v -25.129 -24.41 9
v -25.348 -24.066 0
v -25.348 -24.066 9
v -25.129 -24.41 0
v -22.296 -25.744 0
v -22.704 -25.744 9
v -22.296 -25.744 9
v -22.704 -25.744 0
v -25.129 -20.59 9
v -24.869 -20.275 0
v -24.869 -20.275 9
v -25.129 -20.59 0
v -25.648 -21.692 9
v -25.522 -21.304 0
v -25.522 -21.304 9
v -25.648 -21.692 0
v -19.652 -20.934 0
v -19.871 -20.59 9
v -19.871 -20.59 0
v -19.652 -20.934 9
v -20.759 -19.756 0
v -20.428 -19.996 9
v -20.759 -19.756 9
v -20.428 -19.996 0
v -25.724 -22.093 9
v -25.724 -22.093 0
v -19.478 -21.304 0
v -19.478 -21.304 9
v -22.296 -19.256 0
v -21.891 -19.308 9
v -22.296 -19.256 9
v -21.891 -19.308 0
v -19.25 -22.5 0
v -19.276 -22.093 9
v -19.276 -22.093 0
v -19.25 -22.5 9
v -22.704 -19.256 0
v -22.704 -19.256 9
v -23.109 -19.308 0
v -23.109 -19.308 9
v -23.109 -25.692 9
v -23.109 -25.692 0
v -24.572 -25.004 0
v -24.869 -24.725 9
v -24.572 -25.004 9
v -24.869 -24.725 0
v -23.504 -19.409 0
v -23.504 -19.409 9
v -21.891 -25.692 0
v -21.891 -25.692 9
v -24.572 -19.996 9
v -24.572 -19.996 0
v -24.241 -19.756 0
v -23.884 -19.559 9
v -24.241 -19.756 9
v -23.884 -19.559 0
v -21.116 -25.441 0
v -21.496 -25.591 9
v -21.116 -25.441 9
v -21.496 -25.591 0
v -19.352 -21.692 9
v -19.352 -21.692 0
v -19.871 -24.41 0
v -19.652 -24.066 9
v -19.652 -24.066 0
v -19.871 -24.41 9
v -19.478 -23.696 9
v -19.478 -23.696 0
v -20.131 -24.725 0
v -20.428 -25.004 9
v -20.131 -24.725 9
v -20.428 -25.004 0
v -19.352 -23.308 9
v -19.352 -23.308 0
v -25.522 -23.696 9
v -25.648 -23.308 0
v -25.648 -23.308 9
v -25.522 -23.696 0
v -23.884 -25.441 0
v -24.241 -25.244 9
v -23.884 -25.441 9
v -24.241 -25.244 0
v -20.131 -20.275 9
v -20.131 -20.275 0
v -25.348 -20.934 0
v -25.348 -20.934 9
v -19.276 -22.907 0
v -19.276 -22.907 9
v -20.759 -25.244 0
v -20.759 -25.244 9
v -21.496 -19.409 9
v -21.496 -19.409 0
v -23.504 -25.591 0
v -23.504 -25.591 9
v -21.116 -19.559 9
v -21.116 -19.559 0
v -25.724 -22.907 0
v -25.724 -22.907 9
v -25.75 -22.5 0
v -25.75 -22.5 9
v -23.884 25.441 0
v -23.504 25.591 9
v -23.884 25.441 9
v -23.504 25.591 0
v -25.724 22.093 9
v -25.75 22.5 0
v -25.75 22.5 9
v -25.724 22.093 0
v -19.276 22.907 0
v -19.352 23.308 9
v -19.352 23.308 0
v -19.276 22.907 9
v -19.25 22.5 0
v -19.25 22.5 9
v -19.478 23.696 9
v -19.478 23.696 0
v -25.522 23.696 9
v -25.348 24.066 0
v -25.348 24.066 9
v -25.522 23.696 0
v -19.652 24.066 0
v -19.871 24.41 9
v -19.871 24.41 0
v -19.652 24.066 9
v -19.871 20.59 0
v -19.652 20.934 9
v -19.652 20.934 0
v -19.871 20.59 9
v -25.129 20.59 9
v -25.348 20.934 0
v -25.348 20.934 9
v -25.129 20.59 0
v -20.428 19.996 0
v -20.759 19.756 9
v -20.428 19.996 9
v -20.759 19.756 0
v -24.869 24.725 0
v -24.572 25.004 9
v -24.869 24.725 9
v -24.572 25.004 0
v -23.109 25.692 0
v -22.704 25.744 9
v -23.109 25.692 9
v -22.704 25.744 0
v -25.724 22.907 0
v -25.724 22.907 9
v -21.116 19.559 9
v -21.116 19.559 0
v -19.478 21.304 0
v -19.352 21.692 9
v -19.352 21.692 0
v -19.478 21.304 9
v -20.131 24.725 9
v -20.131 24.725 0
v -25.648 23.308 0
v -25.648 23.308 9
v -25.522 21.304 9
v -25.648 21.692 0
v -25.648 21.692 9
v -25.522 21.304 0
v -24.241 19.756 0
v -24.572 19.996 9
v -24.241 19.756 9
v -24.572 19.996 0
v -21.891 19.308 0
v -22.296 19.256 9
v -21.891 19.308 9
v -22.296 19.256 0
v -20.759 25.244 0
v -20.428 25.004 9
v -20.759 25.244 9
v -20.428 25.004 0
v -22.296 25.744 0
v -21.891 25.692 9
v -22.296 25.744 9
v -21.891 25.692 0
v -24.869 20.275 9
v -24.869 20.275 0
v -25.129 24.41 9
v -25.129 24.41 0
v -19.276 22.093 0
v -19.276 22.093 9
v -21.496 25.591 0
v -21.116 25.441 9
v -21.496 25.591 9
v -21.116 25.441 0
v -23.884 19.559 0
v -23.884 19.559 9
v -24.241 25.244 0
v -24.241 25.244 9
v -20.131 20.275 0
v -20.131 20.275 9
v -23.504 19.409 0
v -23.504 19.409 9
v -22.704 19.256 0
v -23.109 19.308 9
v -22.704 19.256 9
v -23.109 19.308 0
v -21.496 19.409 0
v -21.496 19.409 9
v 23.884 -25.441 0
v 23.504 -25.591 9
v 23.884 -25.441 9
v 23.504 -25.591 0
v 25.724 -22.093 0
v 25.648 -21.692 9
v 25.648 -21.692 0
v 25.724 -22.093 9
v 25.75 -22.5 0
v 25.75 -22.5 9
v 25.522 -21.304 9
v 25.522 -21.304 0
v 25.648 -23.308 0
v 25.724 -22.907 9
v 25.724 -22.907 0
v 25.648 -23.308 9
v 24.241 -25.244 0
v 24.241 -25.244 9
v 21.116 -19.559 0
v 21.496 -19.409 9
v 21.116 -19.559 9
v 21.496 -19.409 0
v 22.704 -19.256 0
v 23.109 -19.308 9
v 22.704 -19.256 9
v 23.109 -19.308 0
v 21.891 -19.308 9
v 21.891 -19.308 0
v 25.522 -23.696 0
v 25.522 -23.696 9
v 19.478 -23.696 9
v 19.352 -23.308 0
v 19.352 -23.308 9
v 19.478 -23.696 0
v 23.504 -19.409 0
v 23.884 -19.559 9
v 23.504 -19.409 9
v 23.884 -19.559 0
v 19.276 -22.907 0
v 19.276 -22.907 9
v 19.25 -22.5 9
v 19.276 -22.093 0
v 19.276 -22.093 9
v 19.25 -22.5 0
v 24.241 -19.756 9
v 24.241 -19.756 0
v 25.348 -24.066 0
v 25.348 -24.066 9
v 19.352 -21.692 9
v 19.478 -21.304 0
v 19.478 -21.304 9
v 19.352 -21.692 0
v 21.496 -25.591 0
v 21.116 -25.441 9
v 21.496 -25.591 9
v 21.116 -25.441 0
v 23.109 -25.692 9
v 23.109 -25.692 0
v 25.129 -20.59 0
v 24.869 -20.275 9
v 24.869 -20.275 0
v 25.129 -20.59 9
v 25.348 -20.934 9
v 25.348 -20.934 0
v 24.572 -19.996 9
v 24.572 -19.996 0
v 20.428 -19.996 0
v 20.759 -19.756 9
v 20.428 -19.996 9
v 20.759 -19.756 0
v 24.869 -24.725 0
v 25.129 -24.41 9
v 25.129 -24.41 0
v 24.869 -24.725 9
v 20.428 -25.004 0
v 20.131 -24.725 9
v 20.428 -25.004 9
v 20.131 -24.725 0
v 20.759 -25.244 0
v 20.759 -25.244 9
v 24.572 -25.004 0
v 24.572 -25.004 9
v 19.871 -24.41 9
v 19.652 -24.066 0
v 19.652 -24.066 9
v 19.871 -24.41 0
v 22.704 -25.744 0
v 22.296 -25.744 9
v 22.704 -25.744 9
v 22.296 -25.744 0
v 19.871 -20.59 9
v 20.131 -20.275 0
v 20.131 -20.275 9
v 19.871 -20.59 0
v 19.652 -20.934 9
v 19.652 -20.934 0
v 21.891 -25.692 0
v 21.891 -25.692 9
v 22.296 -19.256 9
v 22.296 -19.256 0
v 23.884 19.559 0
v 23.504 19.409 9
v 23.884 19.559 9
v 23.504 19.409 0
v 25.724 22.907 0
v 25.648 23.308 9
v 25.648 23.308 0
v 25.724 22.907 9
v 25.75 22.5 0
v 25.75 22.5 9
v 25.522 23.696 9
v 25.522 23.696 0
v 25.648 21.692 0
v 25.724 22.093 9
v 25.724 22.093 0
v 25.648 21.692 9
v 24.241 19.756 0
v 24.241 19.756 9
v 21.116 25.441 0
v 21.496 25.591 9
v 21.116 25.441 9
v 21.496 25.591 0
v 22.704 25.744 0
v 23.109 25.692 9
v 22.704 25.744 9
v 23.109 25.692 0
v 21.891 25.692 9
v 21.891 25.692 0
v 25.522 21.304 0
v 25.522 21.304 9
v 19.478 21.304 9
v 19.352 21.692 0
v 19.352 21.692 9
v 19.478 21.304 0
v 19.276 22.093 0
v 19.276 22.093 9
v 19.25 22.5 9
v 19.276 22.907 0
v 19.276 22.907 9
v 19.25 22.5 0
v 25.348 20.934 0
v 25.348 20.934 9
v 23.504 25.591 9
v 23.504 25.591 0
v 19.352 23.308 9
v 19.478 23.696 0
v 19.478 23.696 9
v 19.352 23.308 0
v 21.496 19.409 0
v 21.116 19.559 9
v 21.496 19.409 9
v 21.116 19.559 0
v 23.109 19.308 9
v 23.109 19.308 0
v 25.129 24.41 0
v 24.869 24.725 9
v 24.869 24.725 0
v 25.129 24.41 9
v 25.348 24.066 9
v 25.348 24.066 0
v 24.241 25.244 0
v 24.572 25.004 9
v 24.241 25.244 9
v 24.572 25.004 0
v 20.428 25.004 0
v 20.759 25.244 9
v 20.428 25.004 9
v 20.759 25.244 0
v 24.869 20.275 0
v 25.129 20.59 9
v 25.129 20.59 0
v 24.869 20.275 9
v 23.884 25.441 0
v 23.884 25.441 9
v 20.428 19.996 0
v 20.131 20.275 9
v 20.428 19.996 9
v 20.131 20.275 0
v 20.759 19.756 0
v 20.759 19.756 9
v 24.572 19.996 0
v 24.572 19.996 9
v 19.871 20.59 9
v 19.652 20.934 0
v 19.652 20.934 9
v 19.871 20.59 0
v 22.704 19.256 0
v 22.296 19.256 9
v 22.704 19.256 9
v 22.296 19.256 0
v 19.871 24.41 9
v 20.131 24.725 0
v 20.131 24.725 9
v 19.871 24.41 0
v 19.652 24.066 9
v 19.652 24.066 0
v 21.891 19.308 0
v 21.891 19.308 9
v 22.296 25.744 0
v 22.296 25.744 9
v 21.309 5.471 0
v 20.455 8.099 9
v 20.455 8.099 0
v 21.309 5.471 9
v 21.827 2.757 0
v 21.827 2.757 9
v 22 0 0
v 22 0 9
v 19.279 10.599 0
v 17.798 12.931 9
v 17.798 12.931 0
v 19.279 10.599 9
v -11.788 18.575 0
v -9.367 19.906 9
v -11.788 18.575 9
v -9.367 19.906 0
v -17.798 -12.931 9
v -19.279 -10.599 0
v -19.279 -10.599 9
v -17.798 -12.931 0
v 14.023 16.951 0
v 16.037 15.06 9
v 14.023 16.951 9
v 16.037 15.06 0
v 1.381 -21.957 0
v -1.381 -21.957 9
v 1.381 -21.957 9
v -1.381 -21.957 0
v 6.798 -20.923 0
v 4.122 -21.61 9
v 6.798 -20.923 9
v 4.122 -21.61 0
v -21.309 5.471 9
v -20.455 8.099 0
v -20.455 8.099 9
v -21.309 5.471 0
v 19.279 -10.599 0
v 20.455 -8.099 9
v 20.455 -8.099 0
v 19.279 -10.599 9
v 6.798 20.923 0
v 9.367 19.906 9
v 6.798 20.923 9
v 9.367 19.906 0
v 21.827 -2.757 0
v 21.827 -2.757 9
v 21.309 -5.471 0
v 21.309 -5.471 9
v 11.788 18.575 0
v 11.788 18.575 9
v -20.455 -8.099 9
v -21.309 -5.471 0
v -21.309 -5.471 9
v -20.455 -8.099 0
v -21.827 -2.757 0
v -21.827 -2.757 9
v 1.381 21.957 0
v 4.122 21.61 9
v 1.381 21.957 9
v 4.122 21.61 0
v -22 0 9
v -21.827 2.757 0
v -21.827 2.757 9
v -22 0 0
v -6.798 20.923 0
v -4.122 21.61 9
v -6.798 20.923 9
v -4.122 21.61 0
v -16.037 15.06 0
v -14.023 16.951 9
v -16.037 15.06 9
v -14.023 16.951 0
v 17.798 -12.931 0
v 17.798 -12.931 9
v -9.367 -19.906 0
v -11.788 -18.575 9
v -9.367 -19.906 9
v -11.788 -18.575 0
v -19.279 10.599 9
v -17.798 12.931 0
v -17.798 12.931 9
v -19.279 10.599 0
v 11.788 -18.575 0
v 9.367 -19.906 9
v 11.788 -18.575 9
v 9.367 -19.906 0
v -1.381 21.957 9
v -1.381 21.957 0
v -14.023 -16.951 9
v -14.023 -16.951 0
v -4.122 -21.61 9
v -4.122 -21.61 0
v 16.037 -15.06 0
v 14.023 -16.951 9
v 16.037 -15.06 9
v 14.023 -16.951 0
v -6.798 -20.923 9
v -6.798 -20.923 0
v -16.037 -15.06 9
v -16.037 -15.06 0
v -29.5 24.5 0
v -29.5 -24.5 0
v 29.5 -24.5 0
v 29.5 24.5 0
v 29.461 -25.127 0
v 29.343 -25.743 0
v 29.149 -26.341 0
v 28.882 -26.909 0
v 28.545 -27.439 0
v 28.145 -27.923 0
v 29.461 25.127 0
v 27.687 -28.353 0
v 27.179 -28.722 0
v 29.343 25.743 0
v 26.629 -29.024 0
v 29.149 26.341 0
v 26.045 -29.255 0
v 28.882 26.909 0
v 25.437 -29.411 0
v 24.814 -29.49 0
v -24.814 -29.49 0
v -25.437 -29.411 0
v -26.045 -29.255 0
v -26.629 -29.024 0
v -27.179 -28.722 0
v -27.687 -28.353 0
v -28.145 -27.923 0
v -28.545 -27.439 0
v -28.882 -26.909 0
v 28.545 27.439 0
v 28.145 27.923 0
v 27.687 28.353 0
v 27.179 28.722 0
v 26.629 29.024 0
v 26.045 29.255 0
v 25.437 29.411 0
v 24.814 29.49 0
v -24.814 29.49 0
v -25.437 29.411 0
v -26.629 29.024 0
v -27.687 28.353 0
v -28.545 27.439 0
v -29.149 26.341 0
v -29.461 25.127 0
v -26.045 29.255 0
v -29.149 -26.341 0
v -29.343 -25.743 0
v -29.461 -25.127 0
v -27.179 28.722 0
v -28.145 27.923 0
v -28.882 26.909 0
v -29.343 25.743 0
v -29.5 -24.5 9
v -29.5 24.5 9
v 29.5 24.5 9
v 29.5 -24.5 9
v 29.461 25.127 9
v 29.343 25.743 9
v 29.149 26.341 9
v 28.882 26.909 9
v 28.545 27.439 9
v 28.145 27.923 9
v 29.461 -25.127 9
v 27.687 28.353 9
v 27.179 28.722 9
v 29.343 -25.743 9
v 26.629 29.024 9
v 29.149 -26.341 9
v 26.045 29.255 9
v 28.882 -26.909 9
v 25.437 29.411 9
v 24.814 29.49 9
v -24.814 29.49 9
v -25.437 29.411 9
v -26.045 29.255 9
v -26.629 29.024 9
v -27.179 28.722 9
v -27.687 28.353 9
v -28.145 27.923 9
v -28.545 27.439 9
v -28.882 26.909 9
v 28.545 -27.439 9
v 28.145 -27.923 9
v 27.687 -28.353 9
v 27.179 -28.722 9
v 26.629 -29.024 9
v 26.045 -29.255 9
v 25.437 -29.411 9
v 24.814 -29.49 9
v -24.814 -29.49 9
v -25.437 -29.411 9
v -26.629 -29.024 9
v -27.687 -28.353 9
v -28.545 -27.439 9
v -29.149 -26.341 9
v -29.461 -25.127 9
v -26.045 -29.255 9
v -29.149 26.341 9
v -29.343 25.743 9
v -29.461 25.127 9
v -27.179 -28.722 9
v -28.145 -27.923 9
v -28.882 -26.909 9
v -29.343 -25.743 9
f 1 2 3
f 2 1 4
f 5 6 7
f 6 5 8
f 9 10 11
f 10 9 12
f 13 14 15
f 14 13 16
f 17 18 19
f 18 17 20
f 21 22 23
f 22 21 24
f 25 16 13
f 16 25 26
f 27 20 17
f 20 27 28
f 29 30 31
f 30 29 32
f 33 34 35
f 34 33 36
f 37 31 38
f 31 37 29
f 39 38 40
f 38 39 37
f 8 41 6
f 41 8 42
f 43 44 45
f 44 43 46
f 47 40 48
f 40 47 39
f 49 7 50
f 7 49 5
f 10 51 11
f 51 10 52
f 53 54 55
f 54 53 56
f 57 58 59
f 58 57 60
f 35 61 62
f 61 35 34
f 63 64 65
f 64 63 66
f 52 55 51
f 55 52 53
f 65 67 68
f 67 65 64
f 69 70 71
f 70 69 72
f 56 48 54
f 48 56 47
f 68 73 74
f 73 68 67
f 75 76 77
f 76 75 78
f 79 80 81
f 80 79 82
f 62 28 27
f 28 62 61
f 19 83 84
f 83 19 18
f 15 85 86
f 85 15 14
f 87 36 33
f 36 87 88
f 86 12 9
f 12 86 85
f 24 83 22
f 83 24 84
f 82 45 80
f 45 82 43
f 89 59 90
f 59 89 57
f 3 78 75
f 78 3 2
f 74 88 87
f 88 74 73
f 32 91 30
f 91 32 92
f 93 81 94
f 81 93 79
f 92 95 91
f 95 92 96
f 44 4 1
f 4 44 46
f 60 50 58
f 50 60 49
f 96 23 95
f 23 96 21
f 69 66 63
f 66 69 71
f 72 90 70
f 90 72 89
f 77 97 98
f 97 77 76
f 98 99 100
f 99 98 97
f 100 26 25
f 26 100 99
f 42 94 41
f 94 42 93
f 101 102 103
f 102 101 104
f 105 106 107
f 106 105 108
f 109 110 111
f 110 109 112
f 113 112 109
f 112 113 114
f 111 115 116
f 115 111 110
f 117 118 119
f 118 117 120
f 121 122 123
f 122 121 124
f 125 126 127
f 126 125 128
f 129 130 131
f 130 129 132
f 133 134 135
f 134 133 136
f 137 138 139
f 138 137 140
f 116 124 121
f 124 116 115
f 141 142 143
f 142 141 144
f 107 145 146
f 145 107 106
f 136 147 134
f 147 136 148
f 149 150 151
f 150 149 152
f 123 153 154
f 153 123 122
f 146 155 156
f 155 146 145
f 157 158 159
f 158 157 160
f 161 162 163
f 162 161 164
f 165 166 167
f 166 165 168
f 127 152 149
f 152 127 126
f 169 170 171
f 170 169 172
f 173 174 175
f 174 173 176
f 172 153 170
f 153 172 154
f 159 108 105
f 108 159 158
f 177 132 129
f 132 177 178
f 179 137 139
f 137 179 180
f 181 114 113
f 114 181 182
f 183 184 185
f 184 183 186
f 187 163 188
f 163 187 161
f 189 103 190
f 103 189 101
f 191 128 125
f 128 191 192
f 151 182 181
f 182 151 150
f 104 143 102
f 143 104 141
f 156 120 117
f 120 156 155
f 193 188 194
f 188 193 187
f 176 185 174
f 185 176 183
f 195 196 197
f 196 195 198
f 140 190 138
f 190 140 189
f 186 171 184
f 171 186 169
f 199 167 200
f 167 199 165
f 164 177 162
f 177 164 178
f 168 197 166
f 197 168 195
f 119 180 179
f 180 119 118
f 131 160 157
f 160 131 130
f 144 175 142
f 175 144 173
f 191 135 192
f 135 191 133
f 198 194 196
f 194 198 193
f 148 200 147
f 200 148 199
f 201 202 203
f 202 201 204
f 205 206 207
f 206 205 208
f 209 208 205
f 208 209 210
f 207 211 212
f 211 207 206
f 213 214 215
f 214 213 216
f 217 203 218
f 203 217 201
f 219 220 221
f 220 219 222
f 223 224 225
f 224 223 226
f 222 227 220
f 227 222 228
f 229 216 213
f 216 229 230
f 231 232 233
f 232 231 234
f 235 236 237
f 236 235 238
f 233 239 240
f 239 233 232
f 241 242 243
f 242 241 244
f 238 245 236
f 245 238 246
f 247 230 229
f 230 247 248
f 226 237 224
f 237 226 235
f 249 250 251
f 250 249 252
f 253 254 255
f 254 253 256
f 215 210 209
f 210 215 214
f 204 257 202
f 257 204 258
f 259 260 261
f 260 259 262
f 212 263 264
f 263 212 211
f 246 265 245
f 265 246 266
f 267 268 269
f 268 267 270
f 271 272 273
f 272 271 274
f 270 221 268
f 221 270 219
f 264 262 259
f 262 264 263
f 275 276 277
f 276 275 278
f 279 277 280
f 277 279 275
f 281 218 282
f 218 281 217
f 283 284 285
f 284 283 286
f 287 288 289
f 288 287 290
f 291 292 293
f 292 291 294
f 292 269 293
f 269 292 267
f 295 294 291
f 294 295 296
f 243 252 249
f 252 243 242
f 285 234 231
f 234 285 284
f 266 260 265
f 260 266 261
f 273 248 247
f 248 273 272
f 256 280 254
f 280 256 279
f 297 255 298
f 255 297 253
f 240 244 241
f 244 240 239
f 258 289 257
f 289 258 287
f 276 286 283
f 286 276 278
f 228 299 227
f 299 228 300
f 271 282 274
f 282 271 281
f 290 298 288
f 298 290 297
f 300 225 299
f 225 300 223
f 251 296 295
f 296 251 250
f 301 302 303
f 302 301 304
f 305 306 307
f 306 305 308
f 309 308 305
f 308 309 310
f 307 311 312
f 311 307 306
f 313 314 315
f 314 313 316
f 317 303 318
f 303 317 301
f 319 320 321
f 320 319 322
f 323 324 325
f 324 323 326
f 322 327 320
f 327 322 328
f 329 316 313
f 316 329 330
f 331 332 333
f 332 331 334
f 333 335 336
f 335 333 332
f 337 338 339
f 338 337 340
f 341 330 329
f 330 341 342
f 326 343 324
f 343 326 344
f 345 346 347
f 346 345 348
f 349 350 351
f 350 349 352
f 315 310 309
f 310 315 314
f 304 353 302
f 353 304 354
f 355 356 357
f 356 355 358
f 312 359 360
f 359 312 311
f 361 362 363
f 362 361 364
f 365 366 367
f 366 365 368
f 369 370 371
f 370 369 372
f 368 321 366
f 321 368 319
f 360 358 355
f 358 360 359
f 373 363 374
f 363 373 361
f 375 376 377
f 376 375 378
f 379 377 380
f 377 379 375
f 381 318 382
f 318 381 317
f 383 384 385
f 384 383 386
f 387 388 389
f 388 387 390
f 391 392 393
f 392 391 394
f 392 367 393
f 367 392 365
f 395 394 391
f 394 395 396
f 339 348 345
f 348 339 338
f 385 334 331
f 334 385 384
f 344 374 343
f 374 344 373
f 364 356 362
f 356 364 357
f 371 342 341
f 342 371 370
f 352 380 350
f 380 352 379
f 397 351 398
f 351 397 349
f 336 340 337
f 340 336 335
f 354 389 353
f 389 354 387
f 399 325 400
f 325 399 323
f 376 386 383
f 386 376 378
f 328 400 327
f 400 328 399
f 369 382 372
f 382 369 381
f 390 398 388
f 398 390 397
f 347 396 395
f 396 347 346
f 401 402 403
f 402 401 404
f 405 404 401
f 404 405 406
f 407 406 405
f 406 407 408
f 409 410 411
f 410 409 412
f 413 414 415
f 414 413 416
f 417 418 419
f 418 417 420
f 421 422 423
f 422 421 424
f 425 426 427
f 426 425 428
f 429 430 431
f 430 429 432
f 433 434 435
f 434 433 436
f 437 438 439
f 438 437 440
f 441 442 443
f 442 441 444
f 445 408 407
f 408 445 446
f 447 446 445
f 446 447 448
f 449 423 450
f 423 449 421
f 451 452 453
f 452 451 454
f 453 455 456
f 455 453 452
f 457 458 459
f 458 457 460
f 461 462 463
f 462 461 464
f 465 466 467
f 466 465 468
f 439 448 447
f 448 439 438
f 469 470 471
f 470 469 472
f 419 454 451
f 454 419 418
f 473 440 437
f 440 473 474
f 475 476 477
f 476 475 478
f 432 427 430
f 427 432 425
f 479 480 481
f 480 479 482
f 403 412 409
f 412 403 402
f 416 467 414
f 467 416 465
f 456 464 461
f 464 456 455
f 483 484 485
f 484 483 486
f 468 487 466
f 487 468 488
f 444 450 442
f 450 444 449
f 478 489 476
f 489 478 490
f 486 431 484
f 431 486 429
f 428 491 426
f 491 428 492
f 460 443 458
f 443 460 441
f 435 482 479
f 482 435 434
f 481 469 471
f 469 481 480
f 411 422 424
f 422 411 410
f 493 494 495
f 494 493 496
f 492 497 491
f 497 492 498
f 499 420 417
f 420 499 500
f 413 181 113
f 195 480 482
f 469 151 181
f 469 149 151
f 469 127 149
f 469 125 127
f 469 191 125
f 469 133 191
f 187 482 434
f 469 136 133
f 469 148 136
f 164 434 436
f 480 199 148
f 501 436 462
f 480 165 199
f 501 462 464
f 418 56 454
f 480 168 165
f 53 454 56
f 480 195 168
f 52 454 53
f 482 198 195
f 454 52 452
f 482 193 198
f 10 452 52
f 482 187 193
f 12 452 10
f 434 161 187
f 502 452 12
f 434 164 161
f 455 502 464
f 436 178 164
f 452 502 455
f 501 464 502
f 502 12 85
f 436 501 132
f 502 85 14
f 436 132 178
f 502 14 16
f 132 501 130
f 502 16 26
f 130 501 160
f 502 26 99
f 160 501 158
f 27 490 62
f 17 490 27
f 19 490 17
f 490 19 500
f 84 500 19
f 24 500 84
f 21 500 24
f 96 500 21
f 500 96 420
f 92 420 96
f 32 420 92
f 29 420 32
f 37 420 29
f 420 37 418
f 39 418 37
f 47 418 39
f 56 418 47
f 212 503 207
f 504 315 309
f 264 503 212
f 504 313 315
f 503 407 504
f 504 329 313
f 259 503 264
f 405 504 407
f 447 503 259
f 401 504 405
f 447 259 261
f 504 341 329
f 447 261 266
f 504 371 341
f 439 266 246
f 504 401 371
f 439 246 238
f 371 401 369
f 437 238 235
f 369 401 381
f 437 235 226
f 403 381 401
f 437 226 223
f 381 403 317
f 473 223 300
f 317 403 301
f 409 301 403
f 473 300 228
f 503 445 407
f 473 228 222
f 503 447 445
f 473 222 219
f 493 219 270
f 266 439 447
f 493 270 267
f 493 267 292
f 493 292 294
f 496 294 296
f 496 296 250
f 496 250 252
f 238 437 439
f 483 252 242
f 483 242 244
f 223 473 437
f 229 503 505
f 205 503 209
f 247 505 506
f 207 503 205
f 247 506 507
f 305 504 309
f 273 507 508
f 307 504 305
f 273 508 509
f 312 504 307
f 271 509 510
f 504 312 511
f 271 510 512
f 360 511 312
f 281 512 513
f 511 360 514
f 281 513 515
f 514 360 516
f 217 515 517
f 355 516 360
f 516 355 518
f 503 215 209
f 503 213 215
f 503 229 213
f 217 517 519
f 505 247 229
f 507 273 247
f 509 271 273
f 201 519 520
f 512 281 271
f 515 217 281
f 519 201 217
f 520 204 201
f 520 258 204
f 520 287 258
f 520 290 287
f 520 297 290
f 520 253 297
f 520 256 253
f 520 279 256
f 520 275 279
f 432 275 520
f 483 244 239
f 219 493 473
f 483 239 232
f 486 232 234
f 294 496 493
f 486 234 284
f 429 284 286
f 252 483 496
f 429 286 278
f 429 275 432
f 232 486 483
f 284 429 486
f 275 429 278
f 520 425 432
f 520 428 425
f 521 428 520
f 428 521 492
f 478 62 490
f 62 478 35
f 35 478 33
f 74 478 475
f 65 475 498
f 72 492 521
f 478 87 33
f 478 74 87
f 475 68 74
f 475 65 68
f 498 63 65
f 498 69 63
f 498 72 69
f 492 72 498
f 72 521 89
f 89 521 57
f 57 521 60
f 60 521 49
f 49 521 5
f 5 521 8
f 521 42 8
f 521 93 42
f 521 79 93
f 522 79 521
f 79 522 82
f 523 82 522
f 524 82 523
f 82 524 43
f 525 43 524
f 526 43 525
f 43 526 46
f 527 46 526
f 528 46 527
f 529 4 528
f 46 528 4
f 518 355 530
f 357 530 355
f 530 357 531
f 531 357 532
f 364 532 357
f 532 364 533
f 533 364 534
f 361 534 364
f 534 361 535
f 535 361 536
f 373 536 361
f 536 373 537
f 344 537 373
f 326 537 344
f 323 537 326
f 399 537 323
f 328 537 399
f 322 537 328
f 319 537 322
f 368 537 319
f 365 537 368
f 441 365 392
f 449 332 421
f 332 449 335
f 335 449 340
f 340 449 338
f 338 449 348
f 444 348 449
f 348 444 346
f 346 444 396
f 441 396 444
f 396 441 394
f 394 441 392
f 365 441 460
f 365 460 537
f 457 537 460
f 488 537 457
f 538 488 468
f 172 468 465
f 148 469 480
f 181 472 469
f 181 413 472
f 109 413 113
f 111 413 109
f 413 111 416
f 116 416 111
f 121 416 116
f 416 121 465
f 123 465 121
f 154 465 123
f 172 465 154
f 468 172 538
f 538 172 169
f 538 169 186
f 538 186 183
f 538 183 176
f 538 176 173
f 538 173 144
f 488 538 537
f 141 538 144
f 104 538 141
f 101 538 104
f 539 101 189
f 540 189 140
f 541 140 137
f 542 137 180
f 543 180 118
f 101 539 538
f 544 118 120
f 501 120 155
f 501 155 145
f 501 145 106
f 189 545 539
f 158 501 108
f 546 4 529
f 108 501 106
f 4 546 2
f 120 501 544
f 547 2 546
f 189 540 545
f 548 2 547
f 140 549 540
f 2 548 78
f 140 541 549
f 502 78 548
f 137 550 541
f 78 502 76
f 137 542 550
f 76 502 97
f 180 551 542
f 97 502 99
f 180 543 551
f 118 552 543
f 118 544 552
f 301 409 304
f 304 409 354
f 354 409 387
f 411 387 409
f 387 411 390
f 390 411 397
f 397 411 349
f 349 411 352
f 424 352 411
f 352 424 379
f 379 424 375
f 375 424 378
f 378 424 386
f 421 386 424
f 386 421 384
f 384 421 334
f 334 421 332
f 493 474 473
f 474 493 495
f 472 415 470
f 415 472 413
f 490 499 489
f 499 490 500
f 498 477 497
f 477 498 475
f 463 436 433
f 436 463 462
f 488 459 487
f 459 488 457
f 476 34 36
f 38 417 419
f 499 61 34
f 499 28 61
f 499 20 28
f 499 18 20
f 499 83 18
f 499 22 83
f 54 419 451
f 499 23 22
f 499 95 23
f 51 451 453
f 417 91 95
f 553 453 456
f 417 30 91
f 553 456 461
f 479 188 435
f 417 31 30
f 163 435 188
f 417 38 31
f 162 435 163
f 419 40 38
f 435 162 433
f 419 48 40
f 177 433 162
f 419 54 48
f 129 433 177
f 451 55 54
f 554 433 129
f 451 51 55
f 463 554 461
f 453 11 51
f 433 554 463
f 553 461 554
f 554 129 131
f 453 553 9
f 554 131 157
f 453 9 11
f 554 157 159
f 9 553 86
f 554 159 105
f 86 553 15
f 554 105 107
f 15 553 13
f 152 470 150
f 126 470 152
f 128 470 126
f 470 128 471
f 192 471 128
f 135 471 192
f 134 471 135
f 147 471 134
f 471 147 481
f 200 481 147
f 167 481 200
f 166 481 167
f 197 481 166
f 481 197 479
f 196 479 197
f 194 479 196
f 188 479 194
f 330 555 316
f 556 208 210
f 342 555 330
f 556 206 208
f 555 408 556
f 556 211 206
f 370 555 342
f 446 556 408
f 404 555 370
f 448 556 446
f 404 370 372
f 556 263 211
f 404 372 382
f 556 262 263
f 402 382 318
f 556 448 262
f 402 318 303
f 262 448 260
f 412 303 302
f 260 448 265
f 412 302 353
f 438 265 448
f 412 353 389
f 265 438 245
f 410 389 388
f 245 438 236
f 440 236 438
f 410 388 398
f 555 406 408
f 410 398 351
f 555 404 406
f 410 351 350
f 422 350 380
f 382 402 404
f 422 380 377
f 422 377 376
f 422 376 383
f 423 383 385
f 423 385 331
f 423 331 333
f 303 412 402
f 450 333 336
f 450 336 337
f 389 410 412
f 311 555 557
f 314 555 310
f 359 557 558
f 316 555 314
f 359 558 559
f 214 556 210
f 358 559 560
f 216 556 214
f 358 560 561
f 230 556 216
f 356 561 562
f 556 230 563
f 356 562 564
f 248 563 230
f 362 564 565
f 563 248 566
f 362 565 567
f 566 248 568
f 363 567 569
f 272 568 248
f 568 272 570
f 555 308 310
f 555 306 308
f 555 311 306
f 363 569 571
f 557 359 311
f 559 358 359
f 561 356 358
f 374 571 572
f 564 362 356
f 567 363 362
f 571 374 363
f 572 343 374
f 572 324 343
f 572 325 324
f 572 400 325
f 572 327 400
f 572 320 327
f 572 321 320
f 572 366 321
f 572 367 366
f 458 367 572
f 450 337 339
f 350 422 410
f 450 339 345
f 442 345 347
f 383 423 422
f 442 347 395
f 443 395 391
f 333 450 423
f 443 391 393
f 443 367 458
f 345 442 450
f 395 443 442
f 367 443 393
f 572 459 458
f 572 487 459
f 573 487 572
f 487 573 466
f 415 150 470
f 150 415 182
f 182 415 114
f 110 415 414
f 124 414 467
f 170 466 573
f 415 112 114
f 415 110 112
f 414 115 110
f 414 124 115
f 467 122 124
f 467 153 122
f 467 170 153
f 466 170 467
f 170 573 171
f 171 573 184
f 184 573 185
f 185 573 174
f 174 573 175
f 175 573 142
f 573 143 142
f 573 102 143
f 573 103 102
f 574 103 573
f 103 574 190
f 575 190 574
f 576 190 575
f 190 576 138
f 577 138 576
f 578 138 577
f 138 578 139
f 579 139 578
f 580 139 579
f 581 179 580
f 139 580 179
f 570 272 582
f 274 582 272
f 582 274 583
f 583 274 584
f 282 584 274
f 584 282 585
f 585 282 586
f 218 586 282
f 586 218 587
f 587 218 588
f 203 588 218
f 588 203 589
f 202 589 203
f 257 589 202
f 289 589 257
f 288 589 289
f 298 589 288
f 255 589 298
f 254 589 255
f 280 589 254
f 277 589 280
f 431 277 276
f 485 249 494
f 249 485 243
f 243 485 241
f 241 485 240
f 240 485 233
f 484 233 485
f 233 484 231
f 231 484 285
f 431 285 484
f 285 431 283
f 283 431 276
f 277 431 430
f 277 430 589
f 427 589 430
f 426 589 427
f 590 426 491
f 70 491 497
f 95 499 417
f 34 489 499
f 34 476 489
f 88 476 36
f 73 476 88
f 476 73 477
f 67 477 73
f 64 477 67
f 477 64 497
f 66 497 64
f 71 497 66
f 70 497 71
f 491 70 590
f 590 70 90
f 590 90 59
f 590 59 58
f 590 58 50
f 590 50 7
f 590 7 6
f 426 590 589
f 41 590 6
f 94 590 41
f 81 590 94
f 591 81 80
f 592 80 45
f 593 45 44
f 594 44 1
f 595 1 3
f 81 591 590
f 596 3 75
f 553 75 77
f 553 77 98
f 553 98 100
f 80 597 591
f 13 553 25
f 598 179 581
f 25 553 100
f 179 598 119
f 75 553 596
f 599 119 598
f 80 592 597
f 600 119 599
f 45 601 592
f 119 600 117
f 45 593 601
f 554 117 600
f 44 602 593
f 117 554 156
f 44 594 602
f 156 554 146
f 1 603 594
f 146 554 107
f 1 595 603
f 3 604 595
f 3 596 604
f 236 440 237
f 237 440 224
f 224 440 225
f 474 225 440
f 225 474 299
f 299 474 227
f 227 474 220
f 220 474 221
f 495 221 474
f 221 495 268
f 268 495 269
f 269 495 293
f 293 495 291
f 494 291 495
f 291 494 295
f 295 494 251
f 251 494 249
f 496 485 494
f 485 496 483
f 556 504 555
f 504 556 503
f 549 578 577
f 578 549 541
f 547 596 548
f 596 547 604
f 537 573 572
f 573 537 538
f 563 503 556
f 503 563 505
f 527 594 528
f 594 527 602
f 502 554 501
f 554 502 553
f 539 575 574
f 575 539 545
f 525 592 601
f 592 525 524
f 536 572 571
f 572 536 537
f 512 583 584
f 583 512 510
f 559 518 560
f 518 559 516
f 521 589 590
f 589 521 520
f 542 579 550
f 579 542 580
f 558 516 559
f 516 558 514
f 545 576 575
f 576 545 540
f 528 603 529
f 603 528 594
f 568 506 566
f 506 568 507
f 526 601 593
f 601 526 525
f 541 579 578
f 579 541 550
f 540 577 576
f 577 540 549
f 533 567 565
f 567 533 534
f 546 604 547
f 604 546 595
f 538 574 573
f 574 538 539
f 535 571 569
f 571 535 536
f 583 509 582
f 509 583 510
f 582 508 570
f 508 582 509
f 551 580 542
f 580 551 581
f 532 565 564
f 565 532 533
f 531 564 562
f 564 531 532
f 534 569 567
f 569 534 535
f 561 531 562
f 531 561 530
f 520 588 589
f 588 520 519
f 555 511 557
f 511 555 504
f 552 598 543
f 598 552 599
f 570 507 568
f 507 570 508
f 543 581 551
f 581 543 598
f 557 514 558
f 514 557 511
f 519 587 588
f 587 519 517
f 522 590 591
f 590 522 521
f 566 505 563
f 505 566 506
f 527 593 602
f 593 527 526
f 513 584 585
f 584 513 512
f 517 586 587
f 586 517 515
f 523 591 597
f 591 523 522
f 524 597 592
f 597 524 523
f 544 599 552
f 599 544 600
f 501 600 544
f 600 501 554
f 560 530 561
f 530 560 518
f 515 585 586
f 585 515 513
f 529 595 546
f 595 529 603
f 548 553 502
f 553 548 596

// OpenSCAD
$fn = 50;


difference() {
	union() {
		hull() {
			translate(v = [-24.5000000000, 24.5000000000, 0]) {
				cylinder(h = 9, r = 5);
			}
			translate(v = [24.5000000000, 24.5000000000, 0]) {
				cylinder(h = 9, r = 5);
			}
			translate(v = [-24.5000000000, -24.5000000000, 0]) {
				cylinder(h = 9, r = 5);
			}
			translate(v = [24.5000000000, -24.5000000000, 0]) {
				cylinder(h = 9, r = 5);
			}
		}
	}
	union() {
		#translate(v = [-22.5000000000, -22.5000000000, -100.0000000000]) {
			cylinder(h = 200, r = 3.2500000000);
		}
		#translate(v = [-22.5000000000, 22.5000000000, -100.0000000000]) {
			cylinder(h = 200, r = 3.2500000000);
		}
		#translate(v = [22.5000000000, -22.5000000000, -100.0000000000]) {
			cylinder(h = 200, r = 3.2500000000);
		}
		#translate(v = [22.5000000000, 22.5000000000, -100.0000000000]) {
			cylinder(h = 200, r = 3.2500000000);
		}
		#cylinder(h = 9, r = 22.0000000000);
	}
}
